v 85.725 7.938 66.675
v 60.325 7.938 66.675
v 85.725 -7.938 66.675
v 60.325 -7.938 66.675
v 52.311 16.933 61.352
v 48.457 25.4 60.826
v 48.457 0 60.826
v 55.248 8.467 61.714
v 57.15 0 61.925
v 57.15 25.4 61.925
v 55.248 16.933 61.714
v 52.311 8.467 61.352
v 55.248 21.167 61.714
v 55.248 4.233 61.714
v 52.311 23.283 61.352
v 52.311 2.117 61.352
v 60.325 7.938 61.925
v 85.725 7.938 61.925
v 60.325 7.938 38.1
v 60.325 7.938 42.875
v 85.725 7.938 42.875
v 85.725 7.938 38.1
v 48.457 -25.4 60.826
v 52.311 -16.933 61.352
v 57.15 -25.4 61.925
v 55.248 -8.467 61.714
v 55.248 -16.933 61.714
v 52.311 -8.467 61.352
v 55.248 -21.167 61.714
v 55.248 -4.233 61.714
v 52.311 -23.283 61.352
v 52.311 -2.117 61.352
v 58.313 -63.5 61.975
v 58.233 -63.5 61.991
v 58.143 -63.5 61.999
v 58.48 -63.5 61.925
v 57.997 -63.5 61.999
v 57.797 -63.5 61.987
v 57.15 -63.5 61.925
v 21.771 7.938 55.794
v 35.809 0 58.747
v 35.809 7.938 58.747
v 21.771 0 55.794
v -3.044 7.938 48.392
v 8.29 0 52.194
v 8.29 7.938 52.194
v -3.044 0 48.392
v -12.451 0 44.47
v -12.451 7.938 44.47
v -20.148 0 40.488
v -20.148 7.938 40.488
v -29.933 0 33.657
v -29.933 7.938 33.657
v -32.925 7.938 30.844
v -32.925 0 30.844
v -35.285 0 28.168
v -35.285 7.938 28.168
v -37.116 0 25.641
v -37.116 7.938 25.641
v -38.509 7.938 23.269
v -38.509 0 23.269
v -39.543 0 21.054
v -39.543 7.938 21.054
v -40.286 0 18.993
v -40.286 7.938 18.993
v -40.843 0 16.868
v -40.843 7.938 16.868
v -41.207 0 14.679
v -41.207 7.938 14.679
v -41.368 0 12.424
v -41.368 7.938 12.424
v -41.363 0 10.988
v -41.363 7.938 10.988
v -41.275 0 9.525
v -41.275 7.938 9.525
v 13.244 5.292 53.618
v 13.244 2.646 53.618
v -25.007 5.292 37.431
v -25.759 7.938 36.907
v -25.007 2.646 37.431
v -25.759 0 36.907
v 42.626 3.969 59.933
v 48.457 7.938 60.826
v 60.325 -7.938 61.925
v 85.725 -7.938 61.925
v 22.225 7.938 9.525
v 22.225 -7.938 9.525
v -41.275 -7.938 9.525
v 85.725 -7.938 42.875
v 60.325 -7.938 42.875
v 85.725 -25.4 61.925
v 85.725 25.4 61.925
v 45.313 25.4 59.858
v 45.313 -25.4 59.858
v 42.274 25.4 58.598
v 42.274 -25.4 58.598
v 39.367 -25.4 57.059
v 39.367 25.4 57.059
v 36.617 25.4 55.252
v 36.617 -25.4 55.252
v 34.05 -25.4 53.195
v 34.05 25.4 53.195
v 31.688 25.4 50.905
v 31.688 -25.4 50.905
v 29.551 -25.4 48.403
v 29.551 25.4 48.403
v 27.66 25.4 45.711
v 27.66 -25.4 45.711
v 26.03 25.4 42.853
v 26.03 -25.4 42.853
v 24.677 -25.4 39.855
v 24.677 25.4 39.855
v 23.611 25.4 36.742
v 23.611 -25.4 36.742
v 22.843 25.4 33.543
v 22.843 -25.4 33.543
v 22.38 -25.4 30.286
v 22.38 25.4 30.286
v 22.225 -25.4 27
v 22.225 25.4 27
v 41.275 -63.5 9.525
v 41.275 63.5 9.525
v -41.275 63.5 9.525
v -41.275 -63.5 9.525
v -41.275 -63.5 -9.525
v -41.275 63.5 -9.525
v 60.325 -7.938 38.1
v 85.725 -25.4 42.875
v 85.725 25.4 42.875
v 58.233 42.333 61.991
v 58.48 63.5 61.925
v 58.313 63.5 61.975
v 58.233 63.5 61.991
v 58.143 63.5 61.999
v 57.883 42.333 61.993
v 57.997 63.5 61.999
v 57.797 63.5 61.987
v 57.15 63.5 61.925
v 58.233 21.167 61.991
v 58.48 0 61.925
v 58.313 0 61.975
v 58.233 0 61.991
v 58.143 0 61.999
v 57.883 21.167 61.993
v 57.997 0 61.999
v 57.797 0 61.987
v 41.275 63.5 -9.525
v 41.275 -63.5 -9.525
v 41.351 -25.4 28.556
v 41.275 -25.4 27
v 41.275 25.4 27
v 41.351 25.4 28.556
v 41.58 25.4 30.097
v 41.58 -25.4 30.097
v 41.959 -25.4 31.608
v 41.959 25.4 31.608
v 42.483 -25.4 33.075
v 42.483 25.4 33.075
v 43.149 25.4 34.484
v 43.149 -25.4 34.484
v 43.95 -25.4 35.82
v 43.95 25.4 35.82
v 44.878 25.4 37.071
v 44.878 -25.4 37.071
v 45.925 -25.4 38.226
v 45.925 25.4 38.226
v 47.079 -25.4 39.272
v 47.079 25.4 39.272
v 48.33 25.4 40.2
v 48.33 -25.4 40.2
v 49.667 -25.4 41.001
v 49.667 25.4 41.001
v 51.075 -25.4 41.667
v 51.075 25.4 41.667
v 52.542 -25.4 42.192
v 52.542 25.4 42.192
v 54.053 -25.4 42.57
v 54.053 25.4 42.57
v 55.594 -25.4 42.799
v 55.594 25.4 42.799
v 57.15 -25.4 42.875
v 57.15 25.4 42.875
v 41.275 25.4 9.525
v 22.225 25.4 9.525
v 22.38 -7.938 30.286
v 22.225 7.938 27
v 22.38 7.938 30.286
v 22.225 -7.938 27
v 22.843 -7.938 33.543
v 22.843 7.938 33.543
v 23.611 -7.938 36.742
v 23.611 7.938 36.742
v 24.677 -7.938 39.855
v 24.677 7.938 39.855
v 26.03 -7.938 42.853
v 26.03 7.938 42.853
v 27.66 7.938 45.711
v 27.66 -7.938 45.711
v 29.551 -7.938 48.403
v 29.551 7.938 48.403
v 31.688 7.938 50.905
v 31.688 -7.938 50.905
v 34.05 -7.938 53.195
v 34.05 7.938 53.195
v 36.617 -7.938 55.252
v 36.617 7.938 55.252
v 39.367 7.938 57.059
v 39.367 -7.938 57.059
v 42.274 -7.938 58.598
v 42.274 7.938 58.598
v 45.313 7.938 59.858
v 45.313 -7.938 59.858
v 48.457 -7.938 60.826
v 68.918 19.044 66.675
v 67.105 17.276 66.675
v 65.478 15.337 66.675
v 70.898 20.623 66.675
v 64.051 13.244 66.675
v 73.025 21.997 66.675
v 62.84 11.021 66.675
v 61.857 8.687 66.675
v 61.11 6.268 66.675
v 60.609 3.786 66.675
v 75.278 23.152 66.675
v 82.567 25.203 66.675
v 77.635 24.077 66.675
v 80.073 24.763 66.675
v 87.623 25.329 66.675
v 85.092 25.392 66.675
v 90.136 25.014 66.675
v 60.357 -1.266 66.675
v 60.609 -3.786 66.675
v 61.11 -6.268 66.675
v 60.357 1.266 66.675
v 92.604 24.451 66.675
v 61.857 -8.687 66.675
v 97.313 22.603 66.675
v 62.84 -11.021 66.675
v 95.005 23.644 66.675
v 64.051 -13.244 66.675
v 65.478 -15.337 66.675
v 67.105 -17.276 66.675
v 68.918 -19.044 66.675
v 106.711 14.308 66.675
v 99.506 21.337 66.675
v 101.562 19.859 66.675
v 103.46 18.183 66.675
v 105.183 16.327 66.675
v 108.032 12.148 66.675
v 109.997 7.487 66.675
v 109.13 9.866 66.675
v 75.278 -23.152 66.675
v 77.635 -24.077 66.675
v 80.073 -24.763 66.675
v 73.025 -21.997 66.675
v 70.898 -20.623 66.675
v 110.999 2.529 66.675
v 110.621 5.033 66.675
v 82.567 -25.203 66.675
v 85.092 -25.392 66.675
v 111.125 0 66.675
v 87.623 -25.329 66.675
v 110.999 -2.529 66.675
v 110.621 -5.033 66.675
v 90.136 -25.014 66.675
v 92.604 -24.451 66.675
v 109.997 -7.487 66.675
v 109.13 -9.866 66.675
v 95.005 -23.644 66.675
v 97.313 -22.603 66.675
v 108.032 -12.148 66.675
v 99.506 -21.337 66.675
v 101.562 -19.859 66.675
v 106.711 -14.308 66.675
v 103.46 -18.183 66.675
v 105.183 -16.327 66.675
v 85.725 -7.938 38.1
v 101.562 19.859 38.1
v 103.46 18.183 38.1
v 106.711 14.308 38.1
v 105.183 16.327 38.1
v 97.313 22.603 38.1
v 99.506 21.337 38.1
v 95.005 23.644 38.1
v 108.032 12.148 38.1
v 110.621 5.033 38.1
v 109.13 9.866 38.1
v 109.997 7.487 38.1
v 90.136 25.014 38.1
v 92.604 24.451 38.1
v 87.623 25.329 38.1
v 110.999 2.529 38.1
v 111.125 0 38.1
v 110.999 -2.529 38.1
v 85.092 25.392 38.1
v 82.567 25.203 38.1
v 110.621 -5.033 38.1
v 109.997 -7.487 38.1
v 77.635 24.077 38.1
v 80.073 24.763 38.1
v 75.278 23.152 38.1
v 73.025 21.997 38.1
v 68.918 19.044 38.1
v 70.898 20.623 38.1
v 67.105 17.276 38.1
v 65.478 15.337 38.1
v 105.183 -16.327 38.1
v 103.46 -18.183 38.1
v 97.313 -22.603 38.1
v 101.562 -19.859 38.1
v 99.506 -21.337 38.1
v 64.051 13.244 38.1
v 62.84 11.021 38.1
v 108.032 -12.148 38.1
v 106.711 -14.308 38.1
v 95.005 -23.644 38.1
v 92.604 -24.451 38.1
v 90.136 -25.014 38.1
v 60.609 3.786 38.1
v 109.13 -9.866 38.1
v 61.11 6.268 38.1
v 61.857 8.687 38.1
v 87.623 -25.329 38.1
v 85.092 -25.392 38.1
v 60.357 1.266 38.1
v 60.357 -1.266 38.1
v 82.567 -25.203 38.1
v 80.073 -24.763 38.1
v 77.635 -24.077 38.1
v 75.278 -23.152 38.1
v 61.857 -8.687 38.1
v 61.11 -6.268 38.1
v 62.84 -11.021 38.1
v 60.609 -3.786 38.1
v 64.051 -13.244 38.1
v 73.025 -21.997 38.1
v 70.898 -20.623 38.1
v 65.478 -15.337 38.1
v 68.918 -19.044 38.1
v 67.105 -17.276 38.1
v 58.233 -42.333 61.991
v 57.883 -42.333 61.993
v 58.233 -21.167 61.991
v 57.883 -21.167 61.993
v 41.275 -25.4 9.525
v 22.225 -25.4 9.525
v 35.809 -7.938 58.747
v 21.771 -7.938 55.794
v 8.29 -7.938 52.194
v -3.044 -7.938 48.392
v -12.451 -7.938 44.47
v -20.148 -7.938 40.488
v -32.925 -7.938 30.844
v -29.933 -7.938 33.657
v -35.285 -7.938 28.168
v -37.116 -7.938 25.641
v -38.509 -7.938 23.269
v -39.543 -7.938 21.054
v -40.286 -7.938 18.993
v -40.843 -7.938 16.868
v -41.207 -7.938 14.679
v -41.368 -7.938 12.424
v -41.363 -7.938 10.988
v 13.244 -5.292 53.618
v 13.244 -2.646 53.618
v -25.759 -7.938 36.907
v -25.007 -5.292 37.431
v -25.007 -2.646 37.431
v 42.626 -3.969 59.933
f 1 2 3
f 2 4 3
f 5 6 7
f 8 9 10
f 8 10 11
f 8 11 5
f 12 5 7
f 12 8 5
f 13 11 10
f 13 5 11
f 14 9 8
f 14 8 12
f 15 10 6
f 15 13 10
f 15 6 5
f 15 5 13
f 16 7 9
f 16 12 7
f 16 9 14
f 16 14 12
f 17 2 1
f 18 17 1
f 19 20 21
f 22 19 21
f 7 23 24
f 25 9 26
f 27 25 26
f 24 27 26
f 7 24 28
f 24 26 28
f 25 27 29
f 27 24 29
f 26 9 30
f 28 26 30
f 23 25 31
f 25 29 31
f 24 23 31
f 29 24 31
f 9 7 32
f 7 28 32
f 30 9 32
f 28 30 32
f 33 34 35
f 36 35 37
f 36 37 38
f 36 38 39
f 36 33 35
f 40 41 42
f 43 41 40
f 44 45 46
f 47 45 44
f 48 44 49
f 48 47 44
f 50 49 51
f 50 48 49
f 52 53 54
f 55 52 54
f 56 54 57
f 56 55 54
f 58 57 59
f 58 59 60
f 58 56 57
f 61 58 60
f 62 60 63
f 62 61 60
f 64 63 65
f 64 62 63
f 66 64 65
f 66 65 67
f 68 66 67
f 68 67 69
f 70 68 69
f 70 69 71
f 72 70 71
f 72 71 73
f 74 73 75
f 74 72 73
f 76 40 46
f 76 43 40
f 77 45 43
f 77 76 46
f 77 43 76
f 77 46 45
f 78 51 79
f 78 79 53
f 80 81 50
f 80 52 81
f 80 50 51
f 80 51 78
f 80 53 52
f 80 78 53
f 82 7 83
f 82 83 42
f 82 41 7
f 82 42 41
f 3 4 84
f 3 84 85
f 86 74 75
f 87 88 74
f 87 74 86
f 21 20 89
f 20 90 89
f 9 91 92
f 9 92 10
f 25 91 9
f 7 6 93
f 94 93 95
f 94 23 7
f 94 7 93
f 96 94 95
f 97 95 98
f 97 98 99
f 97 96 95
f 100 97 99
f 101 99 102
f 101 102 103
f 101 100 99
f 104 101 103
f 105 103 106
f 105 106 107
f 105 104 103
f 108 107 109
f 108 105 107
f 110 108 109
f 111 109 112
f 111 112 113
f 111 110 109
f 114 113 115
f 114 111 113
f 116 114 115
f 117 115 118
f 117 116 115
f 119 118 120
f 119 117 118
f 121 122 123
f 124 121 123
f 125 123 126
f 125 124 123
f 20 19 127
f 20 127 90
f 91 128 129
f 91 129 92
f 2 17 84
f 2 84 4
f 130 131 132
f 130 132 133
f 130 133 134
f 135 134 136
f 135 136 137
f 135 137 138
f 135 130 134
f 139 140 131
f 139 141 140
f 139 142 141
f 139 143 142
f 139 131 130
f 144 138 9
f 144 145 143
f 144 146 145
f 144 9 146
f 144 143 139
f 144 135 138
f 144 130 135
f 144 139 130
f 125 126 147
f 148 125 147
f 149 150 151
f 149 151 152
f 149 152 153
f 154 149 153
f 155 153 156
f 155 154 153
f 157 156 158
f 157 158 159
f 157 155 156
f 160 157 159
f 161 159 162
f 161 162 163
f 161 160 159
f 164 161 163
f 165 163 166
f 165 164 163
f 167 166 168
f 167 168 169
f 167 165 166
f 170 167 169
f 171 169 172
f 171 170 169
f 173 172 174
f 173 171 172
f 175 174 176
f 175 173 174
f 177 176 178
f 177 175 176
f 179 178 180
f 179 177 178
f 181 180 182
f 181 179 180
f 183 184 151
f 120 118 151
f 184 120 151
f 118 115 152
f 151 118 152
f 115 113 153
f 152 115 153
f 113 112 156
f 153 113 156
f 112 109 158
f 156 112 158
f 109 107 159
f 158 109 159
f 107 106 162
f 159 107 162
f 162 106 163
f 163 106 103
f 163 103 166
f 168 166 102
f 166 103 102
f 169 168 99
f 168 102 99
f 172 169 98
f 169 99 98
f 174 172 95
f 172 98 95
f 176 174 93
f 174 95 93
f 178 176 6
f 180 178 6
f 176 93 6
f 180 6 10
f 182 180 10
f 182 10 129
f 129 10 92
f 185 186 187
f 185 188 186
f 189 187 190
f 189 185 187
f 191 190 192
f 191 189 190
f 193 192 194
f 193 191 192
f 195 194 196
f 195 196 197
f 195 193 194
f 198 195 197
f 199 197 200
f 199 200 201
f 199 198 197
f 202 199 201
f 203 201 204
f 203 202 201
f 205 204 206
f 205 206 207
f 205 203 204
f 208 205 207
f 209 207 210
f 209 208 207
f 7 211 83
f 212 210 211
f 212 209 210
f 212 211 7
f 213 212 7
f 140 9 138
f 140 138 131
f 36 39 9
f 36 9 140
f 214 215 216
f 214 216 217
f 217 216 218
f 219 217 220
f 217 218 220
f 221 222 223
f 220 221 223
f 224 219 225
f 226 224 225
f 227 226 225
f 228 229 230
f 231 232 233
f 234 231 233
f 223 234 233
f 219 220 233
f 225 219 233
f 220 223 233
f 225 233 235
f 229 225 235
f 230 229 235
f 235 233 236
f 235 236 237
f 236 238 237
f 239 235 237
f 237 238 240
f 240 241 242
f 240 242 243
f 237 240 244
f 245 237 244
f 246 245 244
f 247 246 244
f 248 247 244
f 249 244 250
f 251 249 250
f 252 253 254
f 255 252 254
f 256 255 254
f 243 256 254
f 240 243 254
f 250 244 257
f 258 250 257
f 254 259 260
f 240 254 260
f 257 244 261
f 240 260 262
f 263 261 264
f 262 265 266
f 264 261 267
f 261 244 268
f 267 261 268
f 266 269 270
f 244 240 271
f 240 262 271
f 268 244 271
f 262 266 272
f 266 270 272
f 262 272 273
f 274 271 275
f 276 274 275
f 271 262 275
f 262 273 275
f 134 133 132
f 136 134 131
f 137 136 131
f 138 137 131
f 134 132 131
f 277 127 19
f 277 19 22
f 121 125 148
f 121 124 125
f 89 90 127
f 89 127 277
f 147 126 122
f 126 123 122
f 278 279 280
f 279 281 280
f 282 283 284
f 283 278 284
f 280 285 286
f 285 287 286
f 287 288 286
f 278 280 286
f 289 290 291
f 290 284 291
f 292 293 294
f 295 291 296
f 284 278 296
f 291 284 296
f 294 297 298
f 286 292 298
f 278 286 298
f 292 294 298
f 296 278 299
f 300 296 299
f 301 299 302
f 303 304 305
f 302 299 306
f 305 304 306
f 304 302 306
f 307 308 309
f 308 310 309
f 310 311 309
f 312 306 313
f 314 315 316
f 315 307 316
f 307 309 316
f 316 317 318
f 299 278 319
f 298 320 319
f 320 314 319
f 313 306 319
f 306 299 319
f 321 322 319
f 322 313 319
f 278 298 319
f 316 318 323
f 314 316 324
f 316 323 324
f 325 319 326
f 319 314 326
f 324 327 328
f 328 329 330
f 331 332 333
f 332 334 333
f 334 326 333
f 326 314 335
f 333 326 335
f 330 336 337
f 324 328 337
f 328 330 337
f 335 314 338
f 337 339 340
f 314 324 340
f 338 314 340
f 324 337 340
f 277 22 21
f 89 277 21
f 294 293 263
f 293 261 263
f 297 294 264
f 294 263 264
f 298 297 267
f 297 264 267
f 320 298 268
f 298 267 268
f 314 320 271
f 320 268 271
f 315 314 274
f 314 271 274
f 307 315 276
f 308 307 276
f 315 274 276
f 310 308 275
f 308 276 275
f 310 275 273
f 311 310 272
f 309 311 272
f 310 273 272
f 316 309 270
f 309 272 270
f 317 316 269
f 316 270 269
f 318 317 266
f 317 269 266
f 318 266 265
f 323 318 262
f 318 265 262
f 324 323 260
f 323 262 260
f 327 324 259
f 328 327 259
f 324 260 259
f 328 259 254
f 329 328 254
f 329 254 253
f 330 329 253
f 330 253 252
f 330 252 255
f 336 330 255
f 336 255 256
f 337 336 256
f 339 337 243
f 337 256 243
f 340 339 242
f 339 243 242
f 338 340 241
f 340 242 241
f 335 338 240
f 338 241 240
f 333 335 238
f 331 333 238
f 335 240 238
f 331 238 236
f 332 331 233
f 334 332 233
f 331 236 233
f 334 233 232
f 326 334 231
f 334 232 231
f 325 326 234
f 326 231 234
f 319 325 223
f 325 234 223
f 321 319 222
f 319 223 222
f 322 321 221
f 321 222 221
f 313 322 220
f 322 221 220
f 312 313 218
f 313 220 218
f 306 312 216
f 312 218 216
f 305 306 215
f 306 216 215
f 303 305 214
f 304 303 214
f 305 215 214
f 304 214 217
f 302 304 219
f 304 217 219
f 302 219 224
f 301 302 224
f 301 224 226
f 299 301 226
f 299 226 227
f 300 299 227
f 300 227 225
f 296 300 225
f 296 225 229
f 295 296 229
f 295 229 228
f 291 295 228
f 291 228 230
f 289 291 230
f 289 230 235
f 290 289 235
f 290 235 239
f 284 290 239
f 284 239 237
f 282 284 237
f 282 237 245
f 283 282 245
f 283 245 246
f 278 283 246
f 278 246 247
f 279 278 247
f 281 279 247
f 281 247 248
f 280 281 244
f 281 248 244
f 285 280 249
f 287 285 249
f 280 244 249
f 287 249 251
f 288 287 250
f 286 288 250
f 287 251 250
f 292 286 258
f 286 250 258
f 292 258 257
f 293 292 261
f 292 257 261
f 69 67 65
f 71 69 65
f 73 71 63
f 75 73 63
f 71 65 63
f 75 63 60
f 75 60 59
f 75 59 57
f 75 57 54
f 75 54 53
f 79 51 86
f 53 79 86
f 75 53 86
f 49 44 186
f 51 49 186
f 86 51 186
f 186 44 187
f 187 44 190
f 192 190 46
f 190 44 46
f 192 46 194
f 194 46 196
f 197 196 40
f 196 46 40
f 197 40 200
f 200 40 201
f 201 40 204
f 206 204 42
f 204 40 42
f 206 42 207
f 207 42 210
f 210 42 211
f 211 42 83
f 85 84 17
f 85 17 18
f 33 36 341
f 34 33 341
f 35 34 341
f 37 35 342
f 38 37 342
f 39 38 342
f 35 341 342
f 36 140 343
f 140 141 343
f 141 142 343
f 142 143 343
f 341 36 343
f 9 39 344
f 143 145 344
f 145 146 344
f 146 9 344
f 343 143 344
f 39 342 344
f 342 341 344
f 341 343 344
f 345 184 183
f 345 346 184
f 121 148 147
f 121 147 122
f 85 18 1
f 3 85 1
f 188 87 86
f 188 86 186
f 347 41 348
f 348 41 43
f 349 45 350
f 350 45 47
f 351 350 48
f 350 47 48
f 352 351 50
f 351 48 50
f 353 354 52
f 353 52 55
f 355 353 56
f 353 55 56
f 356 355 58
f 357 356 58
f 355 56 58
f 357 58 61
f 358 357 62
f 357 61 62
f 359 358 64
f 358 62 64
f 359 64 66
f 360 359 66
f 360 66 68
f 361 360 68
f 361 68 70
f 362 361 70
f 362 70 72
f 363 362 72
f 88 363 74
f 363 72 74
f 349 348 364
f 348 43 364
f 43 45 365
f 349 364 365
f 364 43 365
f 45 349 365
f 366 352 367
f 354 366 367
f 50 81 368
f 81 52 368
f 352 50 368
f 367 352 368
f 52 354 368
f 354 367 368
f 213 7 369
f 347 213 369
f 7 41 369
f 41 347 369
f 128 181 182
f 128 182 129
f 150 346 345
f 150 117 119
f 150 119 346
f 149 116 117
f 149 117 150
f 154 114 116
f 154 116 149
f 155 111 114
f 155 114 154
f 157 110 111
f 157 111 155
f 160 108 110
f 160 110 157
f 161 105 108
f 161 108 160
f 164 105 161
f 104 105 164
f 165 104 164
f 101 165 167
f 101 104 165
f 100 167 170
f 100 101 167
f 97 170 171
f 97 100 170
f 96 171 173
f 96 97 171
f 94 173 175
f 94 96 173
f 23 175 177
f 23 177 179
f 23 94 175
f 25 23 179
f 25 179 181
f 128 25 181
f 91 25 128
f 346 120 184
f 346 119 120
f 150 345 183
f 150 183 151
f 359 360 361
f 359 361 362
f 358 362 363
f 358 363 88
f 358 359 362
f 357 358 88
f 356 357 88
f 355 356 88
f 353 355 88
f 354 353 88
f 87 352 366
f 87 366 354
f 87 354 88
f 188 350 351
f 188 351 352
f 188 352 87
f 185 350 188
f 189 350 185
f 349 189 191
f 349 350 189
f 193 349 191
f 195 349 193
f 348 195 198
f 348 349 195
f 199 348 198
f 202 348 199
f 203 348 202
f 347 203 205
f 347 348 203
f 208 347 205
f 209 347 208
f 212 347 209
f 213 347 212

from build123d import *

# Parameters (mm, degrees)
F1_DEPTH = 63.5
F0_W     = 25.4
F0_H     = 19.05
F2_DEPTH = 25.4
F0_H_2   = 4.7498
F3_DEPTH = 7.9375
F0_H_3   = 4.7752


with BuildPart() as f1:
    # F0 (on Front) → F1 (new body, symmetric)
    with BuildSketch(Plane.XZ):
        with BuildLine():
            add(Edge.make_bspline(
                [(58.4800951183, 61.9252), (58.1913139835, 62.0191193038), (58.1678682987, 62.0313959239), (57.15, 61.9252)],
                knots=[0, 0, 0, 0, 0.0984641392, 0.0984641392, 0.0984641392, 0.0984641392], degree=3))
            Line((57.15, 61.9252), (58.4800951183, 61.9252))
        make_face()
    extrude(amount=F1_DEPTH, both=True)


with BuildPart() as f1b:
    # F0 (on Front) → F1, piece 2 (new body, symmetric)
    with BuildSketch(Plane.XZ):
        Polygon((-41.275, -9.525), (41.275, -9.525), (41.275, 9.525), (22.225, 9.525), (-41.275, 9.525), align=None)
    extrude(amount=F1_DEPTH, both=True)


with BuildPart() as f2:
    # F0 (on Front) → F2 (new body, symmetric)
    with BuildSketch(Plane.XZ):
        with BuildLine():
            Line((22.225, 9.525), (41.275, 9.525))
            Line((41.275, 9.525), (41.275, 27.0002))
            ThreePointArc((41.275, 27.0002), (45.9246798487, 38.2255201513), (57.15, 42.8752))
            Line((57.15, 42.8752), (60.325, 42.8752))
            Line((60.325, 42.8752), (60.325, 61.9252))
            Line((60.325, 61.9252), (58.4800951183, 61.9252))
            Line((58.4800951183, 61.9252), (57.15, 61.9252))
            add(Edge.make_bspline(
                [(57.15, 61.9252), (55.8061602558, 61.784994923), (52.728984431, 61.4382853557), (48.4570208745, 60.8260442455)],
                knots=[0.0984641392, 0.0984641392, 0.0984641392, 0.0984641392, 0.2284613341, 0.2284613341, 0.2284613341, 0.2284613341], degree=3))
            ThreePointArc((48.4570208745, 60.8260442455), (29.5514681463, 48.402925633), (22.225, 27.0002))
            Line((22.225, 27.0002), (22.225, 9.525))
        make_face()
        with Locations((73.025, 52.4002)):
            Rectangle(F0_W, F0_H)
    extrude(amount=F2_DEPTH, both=True)


with BuildPart() as f3:
    # F0 (on Front) → F3 (new body, symmetric)
    with BuildSketch(Plane.XZ):
        with Locations((73.025, 64.3001)):
            Rectangle(F0_W, F0_H_2)
    extrude(amount=F3_DEPTH, both=True)


with BuildPart() as f3b:
    # F0 (on Front) → F3, piece 2 (new body, symmetric)
    with BuildSketch(Plane.XZ):
        with Locations((73.025, 40.4876)):
            Rectangle(F0_W, F0_H_3)
    extrude(amount=F3_DEPTH, both=True)


with BuildPart() as f3c:
    # F0 (on Front) → F3, piece 3 (new body, symmetric)
    with BuildSketch(Plane.XZ):
        with BuildLine():
            add(Edge.make_bspline(
                [(48.4570208745, 60.8260442455), (23.1027425397, 57.1923682297), (-44.3375874156, 44.2054205609), (-41.275, 9.525)],
                knots=[0.2284613341, 0.2284613341, 0.2284613341, 0.2284613341, 1, 1, 1, 1], degree=3))
            Line((-41.275, 9.525), (22.225, 9.525))
            Line((22.225, 9.525), (22.225, 27.0002))
            ThreePointArc((22.225, 27.0002), (29.5514681463, 48.402925633), (48.4570208745, 60.8260442455))
        make_face()
    extrude(amount=F3_DEPTH, both=True)


with BuildPart() as f4:
    # F0 (on Front) → F4 (revolve)
    with BuildSketch(Plane.XZ):
        Polygon((85.725, 61.9252), (85.725, 42.8752), (85.725, 38.1), (111.125, 38.1), (111.125, 66.675), (85.725, 66.675), align=None)
    revolve(axis=Axis((85.725, 0, 52.3875), (0, 0, -1)))


solid = Compound([f1.part, f1b.part, f2.part, f3.part, f3b.part, f3c.part, f4.part])
